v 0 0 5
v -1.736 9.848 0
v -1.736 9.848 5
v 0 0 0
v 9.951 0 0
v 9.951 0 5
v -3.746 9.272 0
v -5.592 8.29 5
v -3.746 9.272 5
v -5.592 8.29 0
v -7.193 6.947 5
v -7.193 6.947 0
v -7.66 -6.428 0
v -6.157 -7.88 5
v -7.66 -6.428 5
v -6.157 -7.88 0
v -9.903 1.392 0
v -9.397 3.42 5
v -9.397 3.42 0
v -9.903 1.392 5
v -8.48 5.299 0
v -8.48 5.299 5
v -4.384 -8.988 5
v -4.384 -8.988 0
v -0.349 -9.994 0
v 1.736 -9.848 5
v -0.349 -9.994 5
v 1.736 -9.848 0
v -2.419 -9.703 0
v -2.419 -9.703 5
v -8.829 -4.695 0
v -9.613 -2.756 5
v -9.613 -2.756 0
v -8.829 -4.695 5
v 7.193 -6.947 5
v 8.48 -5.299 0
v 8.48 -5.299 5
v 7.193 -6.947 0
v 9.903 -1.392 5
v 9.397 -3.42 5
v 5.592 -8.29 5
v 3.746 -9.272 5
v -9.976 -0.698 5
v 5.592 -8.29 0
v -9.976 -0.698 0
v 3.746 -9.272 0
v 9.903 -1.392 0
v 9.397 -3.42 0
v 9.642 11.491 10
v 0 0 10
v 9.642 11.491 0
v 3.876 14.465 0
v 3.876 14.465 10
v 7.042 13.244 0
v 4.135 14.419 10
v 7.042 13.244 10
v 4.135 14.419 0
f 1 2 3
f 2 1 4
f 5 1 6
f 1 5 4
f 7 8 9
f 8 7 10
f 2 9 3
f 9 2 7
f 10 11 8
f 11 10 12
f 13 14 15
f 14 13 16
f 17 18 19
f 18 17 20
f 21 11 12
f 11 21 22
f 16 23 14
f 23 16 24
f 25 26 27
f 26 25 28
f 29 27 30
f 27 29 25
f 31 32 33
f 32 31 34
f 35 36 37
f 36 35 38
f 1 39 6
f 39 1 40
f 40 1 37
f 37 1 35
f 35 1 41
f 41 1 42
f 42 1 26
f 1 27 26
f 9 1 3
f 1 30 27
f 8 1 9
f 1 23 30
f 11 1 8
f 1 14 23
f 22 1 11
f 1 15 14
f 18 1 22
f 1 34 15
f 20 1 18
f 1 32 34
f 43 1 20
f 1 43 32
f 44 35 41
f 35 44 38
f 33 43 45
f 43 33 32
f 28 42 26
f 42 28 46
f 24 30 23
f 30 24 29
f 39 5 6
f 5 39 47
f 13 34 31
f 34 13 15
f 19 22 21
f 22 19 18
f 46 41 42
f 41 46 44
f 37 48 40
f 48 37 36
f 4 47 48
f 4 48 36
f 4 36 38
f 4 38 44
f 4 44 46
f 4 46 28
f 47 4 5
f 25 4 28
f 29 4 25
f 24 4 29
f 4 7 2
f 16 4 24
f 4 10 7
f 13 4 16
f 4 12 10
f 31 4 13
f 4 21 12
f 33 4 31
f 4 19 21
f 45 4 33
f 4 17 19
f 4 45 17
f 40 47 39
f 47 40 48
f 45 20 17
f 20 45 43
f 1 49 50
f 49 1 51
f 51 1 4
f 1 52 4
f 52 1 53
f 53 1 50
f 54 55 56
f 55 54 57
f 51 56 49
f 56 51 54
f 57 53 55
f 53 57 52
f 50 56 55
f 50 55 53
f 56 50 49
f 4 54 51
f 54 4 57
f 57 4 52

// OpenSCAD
// PieTest

/**
* @author: Marcel Jira

 * This module generates a pie slice in OpenSCAD. It is inspired by the
 * [dotscad](https://github.com/dotscad/dotscad)
 * project but uses a different approach.
 * I cannot say if this approach is worse or better.

 * @param float radius Radius of the pie
 * @param float angle  Angle (size) of the pie to slice
 * @param float height Height (thickness) of the pie
 * @param float spin   Angle to spin the slice on the Z axis
 */
module pie(radius, angle, height, spin=0) {
	// calculations
	ang = angle % 360;
	absAng = abs(ang);
	halfAng = absAng % 180;
	negAng = min(ang, 0);

	// submodules
	module pieCube() {
		translate([-radius - 1, 0, -1]) {
			cube([2*(radius + 1), radius + 1, height + 2]);
		}
	}
	
	module rotPieCube() {
		rotate([0, 0, halfAng]) {
			pieCube();
		}
	}
	
	if (ang == 0) {
		cylinder(r=radius, h=height);
	} else {
		rotate([0, 0, ang + spin]) {
			intersection() {
				cylinder(r=radius, h=height);
				if (absAng < 180) {
					difference() {
						pieCube();
						rotPieCube();
					}
				} else {
					union() {
						pieCube();
						rotPieCube();
					}
				}
			}
		}
	}
}

/**
 * When used as a module (statement "use <pie.scad>") the example below will not
 * render. If you run this file alone, it will :)
 */

pie(radius=10, angle=-260, height=5, spin = 0);
pie(radius=15, angle=25, height = 10, spin = 25);
